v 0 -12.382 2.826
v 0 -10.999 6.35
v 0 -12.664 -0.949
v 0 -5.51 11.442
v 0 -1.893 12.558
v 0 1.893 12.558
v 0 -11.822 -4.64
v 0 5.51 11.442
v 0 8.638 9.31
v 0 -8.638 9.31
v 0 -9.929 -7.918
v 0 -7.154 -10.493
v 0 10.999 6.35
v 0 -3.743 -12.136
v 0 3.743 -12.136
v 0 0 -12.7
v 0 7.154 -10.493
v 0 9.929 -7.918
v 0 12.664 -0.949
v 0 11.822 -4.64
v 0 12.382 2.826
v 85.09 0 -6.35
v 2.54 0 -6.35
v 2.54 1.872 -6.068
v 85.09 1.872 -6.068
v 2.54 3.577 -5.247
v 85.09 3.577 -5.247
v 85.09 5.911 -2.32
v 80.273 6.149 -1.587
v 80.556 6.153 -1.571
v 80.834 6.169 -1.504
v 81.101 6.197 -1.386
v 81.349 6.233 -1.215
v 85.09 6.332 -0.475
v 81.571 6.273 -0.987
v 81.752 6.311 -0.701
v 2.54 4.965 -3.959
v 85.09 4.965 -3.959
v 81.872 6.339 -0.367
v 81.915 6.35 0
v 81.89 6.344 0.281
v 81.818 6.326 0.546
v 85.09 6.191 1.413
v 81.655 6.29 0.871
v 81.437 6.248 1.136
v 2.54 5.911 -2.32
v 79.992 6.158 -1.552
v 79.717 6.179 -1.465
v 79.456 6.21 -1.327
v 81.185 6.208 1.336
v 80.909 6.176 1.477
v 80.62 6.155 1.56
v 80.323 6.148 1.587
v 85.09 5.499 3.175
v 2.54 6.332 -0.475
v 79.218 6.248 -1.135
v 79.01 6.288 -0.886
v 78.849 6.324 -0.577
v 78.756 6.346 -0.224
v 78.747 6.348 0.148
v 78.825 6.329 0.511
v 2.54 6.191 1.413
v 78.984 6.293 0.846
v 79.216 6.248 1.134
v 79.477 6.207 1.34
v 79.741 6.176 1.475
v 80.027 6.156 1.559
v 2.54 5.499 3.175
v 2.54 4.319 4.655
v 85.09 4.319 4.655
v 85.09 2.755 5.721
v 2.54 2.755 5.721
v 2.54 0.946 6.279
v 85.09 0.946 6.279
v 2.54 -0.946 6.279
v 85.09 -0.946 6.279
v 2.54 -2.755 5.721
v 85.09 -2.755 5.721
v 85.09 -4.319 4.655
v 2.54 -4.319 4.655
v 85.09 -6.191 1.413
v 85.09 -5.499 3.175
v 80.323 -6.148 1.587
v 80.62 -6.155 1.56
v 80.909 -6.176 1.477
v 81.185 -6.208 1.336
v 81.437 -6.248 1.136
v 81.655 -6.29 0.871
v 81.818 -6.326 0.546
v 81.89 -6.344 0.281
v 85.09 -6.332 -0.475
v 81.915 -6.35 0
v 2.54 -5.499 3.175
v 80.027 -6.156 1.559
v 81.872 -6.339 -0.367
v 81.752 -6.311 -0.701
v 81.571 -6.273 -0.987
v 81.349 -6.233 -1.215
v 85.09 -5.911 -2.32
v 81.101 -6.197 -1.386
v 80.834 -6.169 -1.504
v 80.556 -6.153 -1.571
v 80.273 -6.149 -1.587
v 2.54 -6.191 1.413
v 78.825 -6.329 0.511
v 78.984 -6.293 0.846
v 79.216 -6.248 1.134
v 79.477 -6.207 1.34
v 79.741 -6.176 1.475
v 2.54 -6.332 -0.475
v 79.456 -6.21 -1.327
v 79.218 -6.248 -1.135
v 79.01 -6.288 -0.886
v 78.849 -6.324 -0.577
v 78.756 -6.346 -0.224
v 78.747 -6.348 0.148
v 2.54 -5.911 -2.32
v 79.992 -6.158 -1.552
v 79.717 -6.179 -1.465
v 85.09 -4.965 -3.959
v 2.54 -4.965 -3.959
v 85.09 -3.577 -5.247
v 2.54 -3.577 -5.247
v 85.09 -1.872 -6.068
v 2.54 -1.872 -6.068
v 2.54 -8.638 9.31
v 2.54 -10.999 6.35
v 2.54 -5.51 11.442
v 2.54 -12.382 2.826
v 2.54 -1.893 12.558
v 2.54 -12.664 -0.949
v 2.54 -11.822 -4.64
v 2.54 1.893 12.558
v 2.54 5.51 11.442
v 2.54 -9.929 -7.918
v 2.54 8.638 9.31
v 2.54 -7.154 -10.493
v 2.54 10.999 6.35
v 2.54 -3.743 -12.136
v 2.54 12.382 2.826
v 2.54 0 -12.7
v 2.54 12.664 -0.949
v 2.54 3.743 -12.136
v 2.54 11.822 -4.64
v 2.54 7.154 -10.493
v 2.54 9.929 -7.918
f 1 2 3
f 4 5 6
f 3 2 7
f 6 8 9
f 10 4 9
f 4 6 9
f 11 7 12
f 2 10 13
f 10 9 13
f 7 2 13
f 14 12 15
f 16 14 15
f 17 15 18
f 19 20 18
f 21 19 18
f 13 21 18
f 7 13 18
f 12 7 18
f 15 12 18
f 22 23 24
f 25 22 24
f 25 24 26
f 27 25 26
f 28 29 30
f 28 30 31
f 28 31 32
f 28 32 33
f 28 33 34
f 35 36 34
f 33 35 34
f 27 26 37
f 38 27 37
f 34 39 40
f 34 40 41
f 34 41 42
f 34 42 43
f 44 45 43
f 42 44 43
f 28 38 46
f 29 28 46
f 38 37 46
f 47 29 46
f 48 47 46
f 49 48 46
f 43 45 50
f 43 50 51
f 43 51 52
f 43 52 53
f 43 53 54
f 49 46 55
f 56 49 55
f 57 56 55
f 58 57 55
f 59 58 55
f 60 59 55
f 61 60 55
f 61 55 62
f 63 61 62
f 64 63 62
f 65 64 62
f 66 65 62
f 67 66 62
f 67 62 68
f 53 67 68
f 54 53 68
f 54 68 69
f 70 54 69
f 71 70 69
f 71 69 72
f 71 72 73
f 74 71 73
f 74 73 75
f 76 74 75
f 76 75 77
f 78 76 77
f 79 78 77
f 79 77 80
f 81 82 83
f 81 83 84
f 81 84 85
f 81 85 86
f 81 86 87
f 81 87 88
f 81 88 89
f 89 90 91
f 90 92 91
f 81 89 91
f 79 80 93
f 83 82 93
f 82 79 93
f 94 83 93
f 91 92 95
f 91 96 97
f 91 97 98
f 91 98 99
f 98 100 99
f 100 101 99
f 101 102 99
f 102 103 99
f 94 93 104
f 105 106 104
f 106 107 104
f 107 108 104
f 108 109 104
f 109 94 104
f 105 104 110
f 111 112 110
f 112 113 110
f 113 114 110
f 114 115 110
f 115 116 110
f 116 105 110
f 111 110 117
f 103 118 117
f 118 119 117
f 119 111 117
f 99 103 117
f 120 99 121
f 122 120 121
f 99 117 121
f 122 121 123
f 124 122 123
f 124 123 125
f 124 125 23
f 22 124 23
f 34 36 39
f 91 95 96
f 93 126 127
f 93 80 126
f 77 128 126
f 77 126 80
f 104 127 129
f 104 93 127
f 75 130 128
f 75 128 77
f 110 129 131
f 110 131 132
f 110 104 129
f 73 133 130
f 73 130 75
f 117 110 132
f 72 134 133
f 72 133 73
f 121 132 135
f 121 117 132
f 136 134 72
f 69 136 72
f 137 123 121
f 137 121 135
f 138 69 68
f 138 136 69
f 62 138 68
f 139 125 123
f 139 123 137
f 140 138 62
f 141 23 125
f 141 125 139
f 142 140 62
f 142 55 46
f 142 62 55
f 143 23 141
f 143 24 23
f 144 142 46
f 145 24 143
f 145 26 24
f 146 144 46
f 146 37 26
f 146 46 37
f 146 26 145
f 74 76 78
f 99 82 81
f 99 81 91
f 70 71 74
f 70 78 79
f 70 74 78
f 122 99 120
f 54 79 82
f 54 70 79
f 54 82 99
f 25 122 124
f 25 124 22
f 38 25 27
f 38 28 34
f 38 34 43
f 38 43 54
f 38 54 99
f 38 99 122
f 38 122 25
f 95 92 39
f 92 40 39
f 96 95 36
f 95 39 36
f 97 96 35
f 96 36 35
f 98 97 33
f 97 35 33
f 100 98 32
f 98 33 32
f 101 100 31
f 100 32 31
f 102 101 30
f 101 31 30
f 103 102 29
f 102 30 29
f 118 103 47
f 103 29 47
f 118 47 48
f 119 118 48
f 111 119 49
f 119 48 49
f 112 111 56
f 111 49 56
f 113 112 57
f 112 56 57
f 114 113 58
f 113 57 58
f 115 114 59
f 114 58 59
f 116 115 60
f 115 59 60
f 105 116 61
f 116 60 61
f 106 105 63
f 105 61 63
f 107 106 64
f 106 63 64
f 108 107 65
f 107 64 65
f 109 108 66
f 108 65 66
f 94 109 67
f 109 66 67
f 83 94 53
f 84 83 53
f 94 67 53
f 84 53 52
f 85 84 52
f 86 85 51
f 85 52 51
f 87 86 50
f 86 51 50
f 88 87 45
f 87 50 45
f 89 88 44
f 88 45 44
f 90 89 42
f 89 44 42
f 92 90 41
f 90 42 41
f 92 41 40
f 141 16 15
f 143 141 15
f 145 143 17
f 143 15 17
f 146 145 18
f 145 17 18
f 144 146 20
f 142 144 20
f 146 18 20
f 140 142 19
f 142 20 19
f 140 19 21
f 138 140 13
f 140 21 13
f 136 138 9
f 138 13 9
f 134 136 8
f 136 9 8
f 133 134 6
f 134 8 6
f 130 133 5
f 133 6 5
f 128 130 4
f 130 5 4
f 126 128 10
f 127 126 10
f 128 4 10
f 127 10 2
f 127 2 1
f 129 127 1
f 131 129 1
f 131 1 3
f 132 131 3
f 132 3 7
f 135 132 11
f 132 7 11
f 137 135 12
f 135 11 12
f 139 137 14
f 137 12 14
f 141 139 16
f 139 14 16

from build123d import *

# Parameters (mm, degrees)
SKETCH1_R           = 12.7
BOSS_EXTRUDE1_DEPTH = 2.54
SKETCH2_R           = 6.35
BOSS_EXTRUDE2_DEPTH = 82.55
SKETCH3_R           = 1.5875
CUT_EXTRUDE1_DEPTH  = 12.7


with BuildPart() as part:
    # Sketch1 → Boss-Extrude1 (new body)
    with BuildSketch(Plane(origin=(0, 0, 0), x_dir=(0, 0, -1), z_dir=(1, 0, 0))):
        Circle(SKETCH1_R)
    extrude(amount=BOSS_EXTRUDE1_DEPTH)

    # Sketch2 → Boss-Extrude2 (add)
    with BuildSketch(Plane(origin=(2.54, 0, 0), x_dir=(0, 0, -1), z_dir=(1, 0, 0))):
        Circle(SKETCH2_R)
    extrude(amount=BOSS_EXTRUDE2_DEPTH)

    # Sketch3 → Cut-Extrude1 (cut, symmetric)
    with BuildSketch(Plane(origin=(0, 0, 0), x_dir=(1, 0, 0), z_dir=(0, 1, 0))):
        with Locations((80.3275, 0)):
            Circle(SKETCH3_R)
    extrude(amount=CUT_EXTRUDE1_DEPTH, both=True, mode=Mode.SUBTRACT)


solid = part.part
